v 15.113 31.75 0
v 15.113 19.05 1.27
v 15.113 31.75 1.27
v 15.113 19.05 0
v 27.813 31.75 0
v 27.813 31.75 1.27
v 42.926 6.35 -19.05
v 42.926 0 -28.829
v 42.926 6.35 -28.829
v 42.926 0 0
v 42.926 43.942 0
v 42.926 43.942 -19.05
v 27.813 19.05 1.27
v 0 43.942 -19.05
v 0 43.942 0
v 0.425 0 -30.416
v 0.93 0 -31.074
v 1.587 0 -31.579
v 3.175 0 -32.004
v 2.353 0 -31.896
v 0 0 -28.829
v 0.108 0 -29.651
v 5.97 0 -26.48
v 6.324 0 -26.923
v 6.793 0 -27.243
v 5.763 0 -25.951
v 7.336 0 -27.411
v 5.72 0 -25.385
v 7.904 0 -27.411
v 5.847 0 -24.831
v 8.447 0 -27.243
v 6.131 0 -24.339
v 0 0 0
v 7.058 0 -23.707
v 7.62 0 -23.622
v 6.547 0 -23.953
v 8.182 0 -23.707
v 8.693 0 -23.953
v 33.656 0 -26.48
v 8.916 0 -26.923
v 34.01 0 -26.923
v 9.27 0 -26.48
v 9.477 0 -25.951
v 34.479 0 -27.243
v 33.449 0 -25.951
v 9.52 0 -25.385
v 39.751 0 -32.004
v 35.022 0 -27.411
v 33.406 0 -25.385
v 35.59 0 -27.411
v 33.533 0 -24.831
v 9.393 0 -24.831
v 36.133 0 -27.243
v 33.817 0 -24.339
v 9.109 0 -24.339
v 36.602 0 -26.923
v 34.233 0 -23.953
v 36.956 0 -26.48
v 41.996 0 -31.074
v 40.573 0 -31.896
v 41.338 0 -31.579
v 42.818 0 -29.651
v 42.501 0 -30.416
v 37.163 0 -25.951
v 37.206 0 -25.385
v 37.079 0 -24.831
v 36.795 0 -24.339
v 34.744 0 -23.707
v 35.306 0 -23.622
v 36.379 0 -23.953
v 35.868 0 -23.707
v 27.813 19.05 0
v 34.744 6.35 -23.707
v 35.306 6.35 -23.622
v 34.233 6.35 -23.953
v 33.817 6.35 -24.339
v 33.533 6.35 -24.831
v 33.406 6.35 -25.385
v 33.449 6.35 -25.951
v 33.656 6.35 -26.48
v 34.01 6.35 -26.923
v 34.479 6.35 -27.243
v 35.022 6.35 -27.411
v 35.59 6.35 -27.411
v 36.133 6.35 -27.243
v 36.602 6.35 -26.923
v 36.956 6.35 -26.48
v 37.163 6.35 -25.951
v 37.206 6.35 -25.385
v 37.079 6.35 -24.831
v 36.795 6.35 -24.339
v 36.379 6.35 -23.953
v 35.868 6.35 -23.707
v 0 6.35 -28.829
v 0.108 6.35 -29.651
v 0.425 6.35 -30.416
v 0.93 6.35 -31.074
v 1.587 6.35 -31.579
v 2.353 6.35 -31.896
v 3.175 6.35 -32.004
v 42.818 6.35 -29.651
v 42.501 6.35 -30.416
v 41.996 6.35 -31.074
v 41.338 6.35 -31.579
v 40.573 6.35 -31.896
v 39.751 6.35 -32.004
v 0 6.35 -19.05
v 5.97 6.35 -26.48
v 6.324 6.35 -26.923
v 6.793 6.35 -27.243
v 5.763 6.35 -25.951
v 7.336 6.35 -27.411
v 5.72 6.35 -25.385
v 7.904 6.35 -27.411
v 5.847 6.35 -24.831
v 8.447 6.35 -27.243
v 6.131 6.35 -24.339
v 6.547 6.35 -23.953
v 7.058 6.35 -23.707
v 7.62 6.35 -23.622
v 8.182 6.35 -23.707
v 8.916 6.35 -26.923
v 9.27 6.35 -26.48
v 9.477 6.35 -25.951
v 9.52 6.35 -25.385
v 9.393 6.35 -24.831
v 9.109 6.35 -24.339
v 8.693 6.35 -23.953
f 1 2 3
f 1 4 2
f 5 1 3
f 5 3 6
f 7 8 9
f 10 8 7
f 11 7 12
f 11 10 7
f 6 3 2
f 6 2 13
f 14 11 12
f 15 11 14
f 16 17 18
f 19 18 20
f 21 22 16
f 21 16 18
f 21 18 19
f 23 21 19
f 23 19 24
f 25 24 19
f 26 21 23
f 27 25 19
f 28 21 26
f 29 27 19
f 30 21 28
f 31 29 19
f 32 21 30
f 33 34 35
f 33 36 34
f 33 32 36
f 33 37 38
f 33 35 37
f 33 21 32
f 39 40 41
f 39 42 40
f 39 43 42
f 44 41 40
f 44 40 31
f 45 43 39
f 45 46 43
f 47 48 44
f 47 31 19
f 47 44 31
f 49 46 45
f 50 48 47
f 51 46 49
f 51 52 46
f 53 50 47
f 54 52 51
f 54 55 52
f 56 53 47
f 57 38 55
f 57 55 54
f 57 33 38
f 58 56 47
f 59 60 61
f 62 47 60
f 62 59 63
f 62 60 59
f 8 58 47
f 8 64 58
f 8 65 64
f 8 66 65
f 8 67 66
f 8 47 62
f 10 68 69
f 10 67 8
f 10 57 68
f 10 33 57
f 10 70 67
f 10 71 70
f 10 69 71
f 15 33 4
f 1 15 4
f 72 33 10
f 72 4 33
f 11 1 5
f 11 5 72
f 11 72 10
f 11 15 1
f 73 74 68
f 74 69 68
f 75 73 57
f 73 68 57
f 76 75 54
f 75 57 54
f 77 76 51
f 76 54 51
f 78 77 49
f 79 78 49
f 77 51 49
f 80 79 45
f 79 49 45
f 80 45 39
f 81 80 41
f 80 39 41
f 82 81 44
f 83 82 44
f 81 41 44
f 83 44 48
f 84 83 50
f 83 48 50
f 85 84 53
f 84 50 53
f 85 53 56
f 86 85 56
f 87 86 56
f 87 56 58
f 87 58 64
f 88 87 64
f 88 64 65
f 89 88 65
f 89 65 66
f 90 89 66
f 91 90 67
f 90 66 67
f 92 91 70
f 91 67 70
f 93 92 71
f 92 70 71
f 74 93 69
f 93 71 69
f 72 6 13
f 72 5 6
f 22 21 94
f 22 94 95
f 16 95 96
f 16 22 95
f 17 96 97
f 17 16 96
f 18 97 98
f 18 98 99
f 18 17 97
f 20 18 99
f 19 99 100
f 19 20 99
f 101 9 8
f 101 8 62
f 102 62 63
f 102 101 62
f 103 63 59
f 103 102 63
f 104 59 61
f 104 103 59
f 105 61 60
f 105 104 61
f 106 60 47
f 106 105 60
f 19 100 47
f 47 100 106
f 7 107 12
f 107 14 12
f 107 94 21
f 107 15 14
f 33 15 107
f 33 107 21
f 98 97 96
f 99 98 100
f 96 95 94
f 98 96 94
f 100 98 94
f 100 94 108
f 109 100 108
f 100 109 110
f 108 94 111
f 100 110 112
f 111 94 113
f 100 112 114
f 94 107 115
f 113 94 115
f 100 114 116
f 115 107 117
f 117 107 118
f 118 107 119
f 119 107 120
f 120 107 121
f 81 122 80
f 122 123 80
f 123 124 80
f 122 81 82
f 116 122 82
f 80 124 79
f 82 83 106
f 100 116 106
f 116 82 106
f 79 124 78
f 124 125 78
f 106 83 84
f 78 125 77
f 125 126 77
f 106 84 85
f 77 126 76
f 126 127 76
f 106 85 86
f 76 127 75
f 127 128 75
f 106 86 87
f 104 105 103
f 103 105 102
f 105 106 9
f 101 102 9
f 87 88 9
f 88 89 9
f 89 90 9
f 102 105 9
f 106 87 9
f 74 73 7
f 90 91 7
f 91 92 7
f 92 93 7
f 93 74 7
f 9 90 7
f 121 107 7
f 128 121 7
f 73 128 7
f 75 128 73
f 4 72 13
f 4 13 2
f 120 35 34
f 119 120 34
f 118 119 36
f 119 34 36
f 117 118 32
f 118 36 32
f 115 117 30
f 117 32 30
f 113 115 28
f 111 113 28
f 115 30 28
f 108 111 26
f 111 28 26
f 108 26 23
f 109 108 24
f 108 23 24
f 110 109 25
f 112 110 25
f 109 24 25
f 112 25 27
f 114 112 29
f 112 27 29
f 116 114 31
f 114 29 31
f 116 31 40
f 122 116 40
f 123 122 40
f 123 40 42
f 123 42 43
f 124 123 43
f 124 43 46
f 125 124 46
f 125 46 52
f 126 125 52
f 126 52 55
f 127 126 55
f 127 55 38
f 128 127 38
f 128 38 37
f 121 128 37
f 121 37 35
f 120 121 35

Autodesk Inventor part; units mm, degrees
ref_plane "YZ Plane" through (0, 0, 0) normal (1, 0, 0) x (0, 1, 0)
ref_plane "XZ Plane" through (0, 0, 0) normal (0, 1, 0) x (-1, 0, 0)
ref_plane "XY Plane" through (0, 0, 0) normal (0, 0, 1) x (1, 0, 0)
sketch "Sketch1" plane through (0, 0, 0) normal (0, 0, 1) x (1, 0, 0)
  line L0 (0, 0) -> (42.926, 0)
  line L1 (42.926, 0) -> (42.926, 43.942)
  line L2 (42.926, 43.942) -> (0, 43.942)
  line L3 (0, 43.942) -> (0, 0)
  line L4 (0, 6.35) -> (42.926, 6.35)
  line L5 (15.113, 31.75) -> (27.813, 31.75)
  line L6 (27.813, 31.75) -> (27.813, 19.05)
  line L7 (27.813, 19.05) -> (15.113, 19.05)
  line L8 (15.113, 19.05) -> (15.113, 31.75)
  point P0 (21.463, 31.75)
  point P1 (21.463, 43.942)
  dimension "d0" = 43.942
  dimension "d1" = 42.926
  dimension "d2" = 12.7
  dimension "d3" = 6.35
  dimension "d4" = 12.7
extrude "Extrusion1" add sketch "Sketch1" against normal blind 19.05 contours L3 L2 L1 L4 | L5 L6 L7 L8
extrude "Extrusion2" add sketch "Sketch1" against normal blind 32.004 contours L3 L4 L1 L0
extrude "Extrusion3" add sketch "Sketch1" along normal blind 1.27 contours L5 L6 L7 L8
sketch "Sketch2" plane through (0, 6.35, -19.05) normal (0, 1, 0) x (1, 0, 0)
  line L0 (0, 0) -> (0, 12.954) projected
  line L1 (42.926, 0) -> (42.926, 12.954) projected
  point P0 (0, -19.05)
  point P1 (35.306, 6.477)
  point P2 (7.62, 6.477)
  point P3 (0, 6.477)
  dimension "d11" = 7.62
  dimension "d12" = 7.62
hole "Hole1" at (35.306, 6.35, -25.527) at (7.62, 6.35, -25.527) direction (0, -1, 0) diameter 3.81 end through all
fillet "Fillet1" radius 3.175 2 edges at (42.926, 3.175, -32.004) (0, 3.175, -32.004)
properties part number "OGLiDAR" material "LCP Plastic"
